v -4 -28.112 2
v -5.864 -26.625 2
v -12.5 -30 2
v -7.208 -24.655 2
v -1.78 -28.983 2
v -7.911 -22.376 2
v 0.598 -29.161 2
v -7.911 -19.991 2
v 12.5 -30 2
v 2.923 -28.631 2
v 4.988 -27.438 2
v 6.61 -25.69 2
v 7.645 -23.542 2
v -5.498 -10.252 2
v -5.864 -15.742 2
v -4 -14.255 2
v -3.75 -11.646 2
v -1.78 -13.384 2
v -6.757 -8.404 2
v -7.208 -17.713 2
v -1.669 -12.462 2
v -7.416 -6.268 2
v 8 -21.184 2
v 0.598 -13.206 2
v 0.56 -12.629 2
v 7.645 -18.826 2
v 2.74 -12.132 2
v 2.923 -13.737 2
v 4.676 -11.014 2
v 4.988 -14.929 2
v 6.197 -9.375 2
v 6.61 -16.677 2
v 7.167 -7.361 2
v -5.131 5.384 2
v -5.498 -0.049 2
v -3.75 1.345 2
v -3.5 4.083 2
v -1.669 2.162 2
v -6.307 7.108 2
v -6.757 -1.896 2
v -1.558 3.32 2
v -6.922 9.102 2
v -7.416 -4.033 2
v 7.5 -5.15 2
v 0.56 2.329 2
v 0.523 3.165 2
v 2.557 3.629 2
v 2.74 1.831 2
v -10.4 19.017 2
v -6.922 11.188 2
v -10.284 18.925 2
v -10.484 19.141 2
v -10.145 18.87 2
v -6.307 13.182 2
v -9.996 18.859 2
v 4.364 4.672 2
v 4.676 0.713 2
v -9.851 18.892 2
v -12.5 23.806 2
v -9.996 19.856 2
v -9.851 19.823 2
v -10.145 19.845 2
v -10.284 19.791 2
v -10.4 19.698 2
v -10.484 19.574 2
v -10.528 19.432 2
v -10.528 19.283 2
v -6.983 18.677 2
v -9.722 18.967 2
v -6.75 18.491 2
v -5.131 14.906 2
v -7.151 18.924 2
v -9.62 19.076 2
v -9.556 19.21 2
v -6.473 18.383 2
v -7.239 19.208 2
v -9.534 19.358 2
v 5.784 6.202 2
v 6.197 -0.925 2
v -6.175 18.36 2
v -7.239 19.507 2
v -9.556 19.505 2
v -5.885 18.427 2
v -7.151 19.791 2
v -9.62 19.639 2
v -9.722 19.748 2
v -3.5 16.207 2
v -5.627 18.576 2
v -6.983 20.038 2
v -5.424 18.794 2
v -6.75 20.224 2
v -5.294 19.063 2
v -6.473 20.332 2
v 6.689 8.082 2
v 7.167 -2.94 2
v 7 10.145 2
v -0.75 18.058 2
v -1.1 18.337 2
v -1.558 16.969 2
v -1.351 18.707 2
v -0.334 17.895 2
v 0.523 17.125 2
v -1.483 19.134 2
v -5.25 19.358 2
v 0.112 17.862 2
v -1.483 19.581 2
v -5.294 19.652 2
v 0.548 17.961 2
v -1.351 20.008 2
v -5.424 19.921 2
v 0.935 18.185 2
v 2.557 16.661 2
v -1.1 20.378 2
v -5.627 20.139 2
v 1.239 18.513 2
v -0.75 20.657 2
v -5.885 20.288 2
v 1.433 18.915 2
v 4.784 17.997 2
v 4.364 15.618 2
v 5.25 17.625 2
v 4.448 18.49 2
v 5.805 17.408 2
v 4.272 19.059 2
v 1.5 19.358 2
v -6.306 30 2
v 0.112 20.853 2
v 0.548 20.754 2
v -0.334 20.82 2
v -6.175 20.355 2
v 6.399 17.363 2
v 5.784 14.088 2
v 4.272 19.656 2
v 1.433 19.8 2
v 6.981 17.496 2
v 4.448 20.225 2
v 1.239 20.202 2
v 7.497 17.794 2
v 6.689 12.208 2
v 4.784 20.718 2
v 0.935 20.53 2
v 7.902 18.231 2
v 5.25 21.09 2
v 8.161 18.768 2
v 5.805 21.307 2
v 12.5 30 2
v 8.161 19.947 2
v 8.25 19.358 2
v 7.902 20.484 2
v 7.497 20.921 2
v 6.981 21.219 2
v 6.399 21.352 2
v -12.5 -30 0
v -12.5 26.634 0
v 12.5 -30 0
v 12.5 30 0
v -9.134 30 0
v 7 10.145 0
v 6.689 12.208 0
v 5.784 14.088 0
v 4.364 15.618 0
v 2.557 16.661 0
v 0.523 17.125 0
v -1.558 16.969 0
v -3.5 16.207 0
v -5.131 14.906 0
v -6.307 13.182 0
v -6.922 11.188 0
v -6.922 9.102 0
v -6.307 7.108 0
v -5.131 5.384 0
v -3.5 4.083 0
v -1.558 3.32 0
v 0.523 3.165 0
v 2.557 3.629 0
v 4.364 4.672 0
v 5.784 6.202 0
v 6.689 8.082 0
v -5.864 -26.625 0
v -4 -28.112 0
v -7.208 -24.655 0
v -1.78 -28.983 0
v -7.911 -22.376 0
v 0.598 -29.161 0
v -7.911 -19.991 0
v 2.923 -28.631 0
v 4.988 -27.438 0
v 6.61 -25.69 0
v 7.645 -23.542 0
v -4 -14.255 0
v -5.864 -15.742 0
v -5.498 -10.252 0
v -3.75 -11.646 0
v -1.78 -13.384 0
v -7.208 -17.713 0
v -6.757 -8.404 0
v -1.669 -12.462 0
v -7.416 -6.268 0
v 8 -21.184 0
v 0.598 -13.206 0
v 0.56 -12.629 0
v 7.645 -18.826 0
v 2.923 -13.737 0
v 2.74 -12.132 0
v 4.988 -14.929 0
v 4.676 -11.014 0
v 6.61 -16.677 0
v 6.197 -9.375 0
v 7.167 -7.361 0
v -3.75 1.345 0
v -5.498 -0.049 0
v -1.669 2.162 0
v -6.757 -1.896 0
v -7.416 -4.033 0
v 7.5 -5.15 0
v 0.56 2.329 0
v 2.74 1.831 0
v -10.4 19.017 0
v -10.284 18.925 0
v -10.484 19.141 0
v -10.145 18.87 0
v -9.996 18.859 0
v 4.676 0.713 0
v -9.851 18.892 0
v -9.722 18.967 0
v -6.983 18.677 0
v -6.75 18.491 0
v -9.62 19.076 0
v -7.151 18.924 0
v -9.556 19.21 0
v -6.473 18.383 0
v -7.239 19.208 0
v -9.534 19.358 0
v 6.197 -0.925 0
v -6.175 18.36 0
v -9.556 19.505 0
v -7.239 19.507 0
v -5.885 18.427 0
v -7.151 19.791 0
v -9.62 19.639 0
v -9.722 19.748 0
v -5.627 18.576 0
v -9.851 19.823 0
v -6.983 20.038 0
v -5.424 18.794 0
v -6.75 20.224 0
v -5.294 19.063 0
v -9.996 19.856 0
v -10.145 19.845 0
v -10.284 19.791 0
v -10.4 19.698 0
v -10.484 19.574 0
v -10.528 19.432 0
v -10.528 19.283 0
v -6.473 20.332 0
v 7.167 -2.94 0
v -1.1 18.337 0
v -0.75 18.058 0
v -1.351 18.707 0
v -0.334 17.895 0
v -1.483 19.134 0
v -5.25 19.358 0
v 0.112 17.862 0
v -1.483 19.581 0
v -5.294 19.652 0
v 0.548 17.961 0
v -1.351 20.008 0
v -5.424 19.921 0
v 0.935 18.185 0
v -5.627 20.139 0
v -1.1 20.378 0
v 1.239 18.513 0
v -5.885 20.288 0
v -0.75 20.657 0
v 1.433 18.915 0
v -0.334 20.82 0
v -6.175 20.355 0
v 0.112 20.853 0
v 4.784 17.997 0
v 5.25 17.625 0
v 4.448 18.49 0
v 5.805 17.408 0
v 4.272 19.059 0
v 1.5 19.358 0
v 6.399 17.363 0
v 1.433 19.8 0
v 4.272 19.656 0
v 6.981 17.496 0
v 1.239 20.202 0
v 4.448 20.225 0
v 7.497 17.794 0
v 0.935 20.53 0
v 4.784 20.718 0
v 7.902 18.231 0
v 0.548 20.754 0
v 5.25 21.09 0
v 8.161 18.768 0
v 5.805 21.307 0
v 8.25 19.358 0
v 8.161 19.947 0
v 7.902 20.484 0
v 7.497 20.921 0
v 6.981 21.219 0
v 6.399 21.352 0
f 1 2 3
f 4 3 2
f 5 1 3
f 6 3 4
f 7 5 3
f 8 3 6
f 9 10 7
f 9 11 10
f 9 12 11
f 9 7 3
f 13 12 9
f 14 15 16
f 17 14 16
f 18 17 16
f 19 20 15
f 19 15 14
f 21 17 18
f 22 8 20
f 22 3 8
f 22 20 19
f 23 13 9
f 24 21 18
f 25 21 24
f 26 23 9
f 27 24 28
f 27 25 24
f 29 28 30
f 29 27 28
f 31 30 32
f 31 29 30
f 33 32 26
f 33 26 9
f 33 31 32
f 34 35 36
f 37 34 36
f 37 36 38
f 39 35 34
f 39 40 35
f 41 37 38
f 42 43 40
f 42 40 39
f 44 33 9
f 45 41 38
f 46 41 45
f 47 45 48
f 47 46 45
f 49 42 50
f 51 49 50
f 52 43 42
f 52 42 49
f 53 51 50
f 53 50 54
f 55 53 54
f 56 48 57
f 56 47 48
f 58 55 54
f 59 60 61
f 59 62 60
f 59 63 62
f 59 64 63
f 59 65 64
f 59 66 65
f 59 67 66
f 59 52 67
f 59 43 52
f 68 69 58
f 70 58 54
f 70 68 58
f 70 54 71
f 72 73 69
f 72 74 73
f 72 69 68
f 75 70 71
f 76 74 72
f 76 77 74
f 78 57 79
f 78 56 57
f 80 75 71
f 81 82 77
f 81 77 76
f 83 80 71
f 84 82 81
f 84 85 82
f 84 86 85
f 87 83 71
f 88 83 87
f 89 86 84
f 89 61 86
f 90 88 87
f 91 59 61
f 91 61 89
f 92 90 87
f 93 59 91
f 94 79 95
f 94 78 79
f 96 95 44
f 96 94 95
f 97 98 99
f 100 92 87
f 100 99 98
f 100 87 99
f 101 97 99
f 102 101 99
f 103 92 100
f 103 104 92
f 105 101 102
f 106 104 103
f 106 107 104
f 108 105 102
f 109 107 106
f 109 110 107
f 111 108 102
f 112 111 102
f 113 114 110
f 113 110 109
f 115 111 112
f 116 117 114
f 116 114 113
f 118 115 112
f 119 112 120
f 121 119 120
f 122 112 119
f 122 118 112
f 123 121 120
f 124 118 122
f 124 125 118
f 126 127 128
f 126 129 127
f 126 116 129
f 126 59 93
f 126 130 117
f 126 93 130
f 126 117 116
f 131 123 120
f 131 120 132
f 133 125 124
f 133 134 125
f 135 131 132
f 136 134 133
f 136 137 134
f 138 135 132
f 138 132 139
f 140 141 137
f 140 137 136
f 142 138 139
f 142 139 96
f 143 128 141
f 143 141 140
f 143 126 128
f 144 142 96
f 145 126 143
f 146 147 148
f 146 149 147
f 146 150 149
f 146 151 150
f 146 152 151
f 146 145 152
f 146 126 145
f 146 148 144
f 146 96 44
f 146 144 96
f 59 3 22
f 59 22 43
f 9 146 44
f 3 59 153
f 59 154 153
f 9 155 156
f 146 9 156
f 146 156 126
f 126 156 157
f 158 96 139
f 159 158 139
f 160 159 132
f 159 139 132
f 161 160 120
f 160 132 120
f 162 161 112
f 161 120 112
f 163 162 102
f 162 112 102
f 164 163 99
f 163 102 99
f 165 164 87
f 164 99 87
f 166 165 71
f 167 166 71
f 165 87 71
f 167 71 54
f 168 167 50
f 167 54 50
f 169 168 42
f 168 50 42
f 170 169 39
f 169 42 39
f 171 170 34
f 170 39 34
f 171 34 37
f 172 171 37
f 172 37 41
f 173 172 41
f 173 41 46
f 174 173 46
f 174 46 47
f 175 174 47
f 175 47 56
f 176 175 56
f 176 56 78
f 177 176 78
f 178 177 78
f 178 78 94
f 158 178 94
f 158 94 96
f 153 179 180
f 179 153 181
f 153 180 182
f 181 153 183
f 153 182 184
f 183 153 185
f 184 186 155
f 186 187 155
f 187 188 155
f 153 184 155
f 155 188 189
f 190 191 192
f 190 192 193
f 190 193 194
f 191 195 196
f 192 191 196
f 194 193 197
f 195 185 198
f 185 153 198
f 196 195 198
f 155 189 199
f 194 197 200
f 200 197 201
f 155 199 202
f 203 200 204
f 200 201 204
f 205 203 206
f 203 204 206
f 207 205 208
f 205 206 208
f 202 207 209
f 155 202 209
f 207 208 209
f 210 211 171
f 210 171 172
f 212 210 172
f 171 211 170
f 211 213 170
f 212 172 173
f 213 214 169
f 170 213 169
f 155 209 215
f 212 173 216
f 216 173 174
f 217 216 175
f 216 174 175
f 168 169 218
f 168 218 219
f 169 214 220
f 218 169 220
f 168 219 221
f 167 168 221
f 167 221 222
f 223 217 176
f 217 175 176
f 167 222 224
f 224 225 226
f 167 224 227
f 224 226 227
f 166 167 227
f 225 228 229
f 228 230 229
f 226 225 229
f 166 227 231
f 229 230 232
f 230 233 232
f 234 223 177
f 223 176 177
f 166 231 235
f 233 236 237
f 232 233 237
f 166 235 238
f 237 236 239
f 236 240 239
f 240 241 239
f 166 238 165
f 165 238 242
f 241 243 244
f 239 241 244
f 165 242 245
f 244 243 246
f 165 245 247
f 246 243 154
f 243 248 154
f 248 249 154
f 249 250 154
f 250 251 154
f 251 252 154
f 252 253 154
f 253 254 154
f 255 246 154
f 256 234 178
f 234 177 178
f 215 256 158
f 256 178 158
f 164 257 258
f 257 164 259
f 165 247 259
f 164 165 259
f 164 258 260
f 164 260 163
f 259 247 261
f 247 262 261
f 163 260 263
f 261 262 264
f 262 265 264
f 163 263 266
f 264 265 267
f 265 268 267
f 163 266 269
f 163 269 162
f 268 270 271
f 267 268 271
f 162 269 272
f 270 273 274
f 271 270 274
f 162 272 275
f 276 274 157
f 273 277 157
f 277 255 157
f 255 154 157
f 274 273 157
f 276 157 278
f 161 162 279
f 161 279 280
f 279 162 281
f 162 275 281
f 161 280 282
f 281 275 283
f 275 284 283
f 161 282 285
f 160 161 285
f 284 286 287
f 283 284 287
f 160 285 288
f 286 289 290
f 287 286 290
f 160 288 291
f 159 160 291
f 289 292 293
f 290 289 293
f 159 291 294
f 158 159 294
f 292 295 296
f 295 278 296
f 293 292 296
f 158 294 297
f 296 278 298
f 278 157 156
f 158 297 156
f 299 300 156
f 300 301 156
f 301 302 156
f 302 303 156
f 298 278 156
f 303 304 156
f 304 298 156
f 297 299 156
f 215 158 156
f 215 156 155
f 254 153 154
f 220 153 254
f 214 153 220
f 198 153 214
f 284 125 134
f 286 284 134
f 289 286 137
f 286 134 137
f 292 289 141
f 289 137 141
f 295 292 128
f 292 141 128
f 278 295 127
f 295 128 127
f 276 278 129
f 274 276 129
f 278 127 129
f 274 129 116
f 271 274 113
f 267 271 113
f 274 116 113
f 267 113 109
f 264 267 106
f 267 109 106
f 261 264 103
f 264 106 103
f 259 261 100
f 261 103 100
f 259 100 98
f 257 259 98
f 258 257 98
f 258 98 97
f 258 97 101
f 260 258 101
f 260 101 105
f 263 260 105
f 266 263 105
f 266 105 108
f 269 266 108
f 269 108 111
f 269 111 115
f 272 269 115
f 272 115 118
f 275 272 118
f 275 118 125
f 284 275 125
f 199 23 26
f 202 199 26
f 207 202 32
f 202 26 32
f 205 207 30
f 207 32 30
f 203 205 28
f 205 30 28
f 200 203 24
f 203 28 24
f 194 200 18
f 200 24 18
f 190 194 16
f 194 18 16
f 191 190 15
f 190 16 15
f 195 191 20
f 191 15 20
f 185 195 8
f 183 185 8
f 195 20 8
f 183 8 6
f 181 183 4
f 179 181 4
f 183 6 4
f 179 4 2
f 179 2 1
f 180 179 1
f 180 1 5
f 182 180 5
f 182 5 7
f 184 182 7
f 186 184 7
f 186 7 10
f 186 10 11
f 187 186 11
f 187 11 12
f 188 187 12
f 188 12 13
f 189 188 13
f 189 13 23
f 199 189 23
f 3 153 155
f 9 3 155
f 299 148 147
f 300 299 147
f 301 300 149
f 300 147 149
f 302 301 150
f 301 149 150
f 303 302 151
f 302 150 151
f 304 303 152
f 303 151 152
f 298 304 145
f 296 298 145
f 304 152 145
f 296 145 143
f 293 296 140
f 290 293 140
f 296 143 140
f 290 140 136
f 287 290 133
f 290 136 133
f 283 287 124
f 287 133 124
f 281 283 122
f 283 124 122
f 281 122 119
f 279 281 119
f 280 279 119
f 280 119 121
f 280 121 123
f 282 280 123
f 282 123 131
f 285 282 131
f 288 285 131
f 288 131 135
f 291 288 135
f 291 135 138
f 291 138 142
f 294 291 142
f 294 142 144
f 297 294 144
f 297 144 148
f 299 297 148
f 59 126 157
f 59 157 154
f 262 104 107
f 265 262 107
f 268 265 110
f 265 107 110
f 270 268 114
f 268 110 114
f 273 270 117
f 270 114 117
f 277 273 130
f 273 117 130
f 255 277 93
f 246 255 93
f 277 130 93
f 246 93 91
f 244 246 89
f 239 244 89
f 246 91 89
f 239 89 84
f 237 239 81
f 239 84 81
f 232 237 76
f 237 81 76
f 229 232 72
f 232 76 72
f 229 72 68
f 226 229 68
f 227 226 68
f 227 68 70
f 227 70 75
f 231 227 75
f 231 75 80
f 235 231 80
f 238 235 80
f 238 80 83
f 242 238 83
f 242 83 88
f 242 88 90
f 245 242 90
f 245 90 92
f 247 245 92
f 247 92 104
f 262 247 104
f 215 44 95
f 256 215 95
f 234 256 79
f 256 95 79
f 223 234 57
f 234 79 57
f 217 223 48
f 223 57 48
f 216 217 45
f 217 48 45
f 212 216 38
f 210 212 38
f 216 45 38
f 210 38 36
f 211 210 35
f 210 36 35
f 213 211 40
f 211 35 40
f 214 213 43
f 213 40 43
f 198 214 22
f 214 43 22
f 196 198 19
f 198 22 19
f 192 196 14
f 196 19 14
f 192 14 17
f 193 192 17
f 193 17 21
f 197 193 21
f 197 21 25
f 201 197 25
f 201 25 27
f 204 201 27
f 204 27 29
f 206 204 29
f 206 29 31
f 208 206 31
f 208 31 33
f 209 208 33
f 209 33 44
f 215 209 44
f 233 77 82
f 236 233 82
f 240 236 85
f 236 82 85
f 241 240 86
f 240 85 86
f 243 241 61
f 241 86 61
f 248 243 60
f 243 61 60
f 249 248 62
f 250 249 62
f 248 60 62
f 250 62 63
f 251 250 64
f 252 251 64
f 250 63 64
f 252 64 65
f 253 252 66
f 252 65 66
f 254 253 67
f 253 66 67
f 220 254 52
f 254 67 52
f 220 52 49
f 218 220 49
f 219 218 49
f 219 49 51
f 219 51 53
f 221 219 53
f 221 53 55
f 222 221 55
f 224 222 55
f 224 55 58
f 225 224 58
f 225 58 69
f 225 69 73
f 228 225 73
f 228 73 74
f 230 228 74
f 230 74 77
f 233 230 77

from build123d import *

# Parameters (mm, degrees)
F1_DEPTH = 2
F2_SIZE  = 1.99999
F3_R     = 1
F3_R_2   = 0.5
F3_R_3   = 1.5
F3_R_4   = 2
F4_DEPTH = 25.4
F5_R     = 7.5
F5_R_2   = 8
F5_R_3   = 7
F6_DEPTH = 25.4


# Not quite as in the source:
# - a fillet or chamfer is up to 0.001 mm smaller than in the source, because OpenCascade refuses the exact size


with BuildPart() as f1:
    # F0 (on Top) → F1 (new body)
    with BuildSketch(Plane.XY):
        Polygon((-12.5, -30), (12.5, -30), (12.5, 30), (-9.1340300441, 30), (-12.5, 26.6340300441), align=None)
    extrude(amount=F1_DEPTH)

    # F2 (size 2 in the source; OpenCascade refuses exactly that, so slightly less here)
    f2_edges = [f1.edges().sort_by_distance(p)[0] for p in [
        (-10.817015, 28.317015, 2),
    ]]
    chamfer(f2_edges, length=F2_SIZE)

    # F3 (on face) → F4 (cut)
    with BuildSketch(Plane.XY.offset(2)):
        with Locations((-6.25, 19.3575184322)):
            Circle(F3_R)
        with Locations((-10.0335823372, 19.3575184322)):
            Circle(F3_R_2)
        with Locations((0, 19.3575184322)):
            Circle(F3_R_3)
        with Locations((6.25, 19.3575184322)):
            Circle(F3_R_4)
    extrude(amount=-F4_DEPTH, mode=Mode.SUBTRACT)

    # F5 (on face) → F6 (cut)
    with BuildSketch(Plane.XY.offset(2)):
        with Locations((0, -5.1503664152)):
            Circle(F5_R)
        with Locations((0, -21.1835757454)):
            Circle(F5_R_2)
        with Locations((0, 10.1449948387)):
            Circle(F5_R_3)
    extrude(amount=-F6_DEPTH, mode=Mode.SUBTRACT)


solid = f1.part
